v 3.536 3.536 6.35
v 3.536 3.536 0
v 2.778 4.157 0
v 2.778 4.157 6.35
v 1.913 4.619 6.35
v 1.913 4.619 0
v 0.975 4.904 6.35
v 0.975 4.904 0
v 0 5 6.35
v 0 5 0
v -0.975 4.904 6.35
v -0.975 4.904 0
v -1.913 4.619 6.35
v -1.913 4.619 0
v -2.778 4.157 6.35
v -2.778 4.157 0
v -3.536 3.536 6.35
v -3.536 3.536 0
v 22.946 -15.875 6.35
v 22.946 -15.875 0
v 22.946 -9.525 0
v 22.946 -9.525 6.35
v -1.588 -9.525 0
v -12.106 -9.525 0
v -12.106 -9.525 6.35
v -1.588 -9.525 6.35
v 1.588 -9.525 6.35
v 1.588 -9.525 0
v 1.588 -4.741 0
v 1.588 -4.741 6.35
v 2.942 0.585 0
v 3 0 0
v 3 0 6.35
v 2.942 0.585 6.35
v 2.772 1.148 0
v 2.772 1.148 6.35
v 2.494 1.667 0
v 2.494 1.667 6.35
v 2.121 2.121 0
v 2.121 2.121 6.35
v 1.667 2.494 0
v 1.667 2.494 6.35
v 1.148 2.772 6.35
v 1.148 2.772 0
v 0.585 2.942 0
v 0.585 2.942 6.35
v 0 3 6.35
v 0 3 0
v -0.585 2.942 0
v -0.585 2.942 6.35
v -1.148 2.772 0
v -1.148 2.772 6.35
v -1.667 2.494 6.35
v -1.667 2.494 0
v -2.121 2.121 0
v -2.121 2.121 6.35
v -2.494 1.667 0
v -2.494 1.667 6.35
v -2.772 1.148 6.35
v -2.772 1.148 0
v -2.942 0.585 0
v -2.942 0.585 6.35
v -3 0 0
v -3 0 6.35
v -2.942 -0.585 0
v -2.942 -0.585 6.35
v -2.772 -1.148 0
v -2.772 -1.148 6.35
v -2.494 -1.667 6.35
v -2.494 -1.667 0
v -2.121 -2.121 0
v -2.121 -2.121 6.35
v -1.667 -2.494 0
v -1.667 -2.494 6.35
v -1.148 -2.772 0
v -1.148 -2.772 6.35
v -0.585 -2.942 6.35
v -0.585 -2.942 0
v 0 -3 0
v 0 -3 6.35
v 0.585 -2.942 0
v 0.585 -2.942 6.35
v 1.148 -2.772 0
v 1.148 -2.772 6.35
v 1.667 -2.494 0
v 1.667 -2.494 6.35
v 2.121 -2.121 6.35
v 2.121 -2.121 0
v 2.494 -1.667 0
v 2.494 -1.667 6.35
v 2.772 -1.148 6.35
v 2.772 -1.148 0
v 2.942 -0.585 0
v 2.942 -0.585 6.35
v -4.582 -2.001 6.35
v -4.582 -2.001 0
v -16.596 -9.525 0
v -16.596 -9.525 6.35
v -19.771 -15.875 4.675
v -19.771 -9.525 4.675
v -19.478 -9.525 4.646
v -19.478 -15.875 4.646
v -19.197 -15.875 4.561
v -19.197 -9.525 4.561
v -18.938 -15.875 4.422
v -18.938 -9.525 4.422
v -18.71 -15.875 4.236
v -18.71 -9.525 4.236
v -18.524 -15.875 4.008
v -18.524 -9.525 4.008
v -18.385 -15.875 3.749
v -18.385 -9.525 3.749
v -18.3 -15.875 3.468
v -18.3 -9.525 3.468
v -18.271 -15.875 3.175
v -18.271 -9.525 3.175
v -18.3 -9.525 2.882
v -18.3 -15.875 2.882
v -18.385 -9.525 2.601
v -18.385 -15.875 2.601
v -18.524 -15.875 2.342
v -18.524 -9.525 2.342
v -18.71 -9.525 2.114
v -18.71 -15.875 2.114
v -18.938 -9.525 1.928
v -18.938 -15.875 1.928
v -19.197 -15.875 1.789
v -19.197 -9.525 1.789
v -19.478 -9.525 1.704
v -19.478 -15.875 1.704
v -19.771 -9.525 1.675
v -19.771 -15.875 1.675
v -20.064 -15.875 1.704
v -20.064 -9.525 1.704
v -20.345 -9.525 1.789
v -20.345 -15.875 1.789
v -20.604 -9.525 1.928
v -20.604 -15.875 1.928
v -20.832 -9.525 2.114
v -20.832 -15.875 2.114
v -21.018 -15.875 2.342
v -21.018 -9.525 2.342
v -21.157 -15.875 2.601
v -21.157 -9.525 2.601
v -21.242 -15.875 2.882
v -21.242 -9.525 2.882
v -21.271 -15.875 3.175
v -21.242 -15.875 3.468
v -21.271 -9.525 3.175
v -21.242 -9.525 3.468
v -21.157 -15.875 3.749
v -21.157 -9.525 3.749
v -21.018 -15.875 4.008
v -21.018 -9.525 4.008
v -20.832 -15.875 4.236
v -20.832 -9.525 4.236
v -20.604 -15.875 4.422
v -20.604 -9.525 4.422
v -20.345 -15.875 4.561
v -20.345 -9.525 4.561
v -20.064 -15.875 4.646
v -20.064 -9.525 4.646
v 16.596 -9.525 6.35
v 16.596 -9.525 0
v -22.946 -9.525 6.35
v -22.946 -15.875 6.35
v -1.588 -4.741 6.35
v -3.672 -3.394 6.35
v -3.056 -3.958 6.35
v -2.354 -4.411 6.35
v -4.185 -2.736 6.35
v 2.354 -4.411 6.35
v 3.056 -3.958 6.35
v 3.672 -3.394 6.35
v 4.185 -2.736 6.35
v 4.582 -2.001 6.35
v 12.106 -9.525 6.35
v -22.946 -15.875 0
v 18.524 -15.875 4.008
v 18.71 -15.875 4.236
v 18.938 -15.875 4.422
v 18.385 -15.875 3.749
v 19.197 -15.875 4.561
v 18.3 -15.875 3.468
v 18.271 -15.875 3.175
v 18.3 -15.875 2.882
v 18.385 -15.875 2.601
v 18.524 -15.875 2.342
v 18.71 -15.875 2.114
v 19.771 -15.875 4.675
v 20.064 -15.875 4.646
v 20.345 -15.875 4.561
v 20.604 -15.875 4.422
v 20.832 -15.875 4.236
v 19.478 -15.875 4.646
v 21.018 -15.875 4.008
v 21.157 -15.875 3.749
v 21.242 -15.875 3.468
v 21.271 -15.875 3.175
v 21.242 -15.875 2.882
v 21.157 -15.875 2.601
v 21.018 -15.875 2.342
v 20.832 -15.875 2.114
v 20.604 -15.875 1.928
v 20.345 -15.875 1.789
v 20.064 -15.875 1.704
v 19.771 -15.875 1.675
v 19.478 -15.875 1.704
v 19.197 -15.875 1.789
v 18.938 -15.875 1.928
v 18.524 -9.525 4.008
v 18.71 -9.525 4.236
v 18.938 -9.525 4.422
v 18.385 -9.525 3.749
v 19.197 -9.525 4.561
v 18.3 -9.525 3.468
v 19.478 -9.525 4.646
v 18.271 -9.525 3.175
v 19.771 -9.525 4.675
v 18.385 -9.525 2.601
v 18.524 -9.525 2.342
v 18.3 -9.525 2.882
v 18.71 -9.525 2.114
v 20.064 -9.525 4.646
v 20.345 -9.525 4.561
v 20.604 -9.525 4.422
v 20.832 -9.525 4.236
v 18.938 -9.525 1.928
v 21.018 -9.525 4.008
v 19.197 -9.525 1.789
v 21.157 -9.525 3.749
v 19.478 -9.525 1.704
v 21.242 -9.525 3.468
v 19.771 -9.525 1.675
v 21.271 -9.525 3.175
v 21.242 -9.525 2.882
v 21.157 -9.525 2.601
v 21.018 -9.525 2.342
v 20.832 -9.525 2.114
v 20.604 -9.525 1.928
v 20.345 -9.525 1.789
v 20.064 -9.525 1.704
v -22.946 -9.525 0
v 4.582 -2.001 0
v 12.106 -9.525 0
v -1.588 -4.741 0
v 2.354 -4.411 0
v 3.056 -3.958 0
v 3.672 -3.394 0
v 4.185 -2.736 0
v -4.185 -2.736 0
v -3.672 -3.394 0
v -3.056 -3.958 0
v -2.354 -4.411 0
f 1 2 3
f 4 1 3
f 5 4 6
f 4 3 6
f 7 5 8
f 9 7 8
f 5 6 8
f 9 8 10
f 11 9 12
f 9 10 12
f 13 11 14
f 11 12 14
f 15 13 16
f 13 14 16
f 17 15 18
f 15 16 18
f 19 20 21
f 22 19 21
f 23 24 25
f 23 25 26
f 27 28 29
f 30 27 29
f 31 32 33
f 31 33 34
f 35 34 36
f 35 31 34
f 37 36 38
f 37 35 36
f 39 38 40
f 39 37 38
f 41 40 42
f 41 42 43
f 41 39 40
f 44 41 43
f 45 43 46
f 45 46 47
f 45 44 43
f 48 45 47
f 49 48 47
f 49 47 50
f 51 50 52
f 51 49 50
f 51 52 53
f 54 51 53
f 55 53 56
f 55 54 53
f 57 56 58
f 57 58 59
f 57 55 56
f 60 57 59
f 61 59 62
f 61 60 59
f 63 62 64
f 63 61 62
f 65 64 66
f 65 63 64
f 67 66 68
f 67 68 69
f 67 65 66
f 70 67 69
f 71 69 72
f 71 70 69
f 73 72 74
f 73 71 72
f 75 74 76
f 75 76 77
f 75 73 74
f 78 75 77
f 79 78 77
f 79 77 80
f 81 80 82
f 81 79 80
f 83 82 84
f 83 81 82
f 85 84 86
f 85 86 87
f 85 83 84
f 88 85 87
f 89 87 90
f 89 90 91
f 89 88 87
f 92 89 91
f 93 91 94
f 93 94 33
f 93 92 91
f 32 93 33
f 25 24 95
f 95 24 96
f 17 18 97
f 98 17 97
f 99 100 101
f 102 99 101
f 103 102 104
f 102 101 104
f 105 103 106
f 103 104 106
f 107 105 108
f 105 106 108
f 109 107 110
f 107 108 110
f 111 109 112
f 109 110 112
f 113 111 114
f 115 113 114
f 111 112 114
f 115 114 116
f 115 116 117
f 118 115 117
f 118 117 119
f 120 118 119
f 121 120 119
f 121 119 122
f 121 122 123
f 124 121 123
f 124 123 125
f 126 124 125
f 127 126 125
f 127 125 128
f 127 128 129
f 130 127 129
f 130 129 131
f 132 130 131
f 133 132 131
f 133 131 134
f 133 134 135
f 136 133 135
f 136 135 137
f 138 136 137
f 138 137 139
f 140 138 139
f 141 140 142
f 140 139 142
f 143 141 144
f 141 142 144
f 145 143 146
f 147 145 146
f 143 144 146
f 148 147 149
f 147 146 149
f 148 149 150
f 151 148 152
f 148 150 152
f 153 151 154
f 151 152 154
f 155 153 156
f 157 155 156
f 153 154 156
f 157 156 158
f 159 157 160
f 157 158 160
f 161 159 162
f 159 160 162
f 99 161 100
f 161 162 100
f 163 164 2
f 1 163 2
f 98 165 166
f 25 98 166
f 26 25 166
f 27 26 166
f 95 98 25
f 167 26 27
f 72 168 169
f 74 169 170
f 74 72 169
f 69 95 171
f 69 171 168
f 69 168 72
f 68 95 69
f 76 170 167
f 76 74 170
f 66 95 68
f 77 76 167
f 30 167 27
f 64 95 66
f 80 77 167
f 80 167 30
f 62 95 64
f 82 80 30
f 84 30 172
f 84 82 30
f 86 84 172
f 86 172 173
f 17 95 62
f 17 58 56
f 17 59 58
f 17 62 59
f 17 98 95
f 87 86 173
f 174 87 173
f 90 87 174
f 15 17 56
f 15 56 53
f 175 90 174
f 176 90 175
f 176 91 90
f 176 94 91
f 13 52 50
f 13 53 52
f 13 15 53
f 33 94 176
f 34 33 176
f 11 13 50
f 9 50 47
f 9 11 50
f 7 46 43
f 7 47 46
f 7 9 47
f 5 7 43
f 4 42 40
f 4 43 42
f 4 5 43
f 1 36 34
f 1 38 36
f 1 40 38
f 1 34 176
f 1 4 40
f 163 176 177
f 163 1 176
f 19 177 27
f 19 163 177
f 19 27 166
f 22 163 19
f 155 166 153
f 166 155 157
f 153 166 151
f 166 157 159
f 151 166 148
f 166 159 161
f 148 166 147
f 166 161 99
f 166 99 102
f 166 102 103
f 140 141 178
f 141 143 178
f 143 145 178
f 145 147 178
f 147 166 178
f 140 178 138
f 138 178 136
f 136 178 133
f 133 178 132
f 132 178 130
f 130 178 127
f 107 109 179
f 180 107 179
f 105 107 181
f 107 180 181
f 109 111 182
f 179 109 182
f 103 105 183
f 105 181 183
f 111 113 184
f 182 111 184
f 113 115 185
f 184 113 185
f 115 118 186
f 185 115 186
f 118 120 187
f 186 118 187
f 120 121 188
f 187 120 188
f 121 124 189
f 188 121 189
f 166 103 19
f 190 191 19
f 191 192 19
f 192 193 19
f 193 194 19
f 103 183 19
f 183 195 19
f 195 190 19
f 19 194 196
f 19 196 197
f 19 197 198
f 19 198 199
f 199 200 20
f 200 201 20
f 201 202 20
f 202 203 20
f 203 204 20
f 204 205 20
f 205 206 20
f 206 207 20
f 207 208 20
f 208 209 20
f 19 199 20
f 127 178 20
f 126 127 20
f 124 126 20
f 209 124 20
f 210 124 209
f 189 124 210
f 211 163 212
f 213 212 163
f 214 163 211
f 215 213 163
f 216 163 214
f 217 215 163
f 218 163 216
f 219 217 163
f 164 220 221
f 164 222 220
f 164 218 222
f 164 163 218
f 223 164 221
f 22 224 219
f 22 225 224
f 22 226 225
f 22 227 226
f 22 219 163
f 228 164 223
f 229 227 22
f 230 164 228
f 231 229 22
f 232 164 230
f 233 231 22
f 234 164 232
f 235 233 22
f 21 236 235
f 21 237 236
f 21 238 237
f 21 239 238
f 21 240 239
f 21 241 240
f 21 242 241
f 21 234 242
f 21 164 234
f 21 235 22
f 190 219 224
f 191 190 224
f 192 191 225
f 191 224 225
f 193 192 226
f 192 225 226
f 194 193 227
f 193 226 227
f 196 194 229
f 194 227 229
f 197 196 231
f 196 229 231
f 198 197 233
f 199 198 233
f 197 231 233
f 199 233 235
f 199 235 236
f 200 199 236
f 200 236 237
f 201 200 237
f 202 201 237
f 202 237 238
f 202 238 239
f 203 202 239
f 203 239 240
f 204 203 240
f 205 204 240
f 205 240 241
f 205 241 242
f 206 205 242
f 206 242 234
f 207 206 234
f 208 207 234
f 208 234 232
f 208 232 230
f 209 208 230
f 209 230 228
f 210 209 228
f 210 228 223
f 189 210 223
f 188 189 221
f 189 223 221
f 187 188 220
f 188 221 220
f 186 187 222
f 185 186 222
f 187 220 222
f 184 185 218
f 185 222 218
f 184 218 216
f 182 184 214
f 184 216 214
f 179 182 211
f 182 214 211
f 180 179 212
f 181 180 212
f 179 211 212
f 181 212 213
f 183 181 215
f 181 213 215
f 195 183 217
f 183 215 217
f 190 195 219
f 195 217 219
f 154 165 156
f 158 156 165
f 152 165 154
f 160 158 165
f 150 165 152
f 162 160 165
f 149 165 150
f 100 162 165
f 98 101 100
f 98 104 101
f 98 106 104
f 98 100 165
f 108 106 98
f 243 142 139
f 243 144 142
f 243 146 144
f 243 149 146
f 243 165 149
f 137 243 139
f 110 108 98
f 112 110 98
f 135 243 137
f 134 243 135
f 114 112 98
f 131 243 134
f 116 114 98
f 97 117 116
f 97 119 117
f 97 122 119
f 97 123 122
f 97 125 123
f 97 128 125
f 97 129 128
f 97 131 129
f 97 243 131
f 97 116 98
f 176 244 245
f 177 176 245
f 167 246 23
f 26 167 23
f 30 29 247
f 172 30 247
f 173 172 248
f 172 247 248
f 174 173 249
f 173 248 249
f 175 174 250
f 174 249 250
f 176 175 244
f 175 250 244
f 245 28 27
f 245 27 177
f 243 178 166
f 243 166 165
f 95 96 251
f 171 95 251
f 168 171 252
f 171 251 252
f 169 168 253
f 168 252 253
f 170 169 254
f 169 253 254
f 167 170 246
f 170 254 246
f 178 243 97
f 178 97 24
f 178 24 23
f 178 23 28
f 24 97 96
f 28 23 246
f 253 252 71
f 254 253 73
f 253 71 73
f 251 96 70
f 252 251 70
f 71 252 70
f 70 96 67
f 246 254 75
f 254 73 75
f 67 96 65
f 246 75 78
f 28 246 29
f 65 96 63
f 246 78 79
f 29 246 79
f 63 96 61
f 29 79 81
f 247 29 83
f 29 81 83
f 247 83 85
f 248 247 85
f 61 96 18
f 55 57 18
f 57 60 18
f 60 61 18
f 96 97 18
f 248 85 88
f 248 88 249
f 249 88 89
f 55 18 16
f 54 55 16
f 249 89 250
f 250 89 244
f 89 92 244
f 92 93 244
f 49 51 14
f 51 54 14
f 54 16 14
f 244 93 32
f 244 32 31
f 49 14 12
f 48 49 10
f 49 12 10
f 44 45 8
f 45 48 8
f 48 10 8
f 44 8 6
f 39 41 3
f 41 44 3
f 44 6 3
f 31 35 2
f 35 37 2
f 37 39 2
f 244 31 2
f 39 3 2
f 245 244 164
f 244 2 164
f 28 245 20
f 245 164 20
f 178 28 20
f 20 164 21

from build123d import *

# Parameters (mm, degrees)
SKETCH1_R           = 5
SKETCH1_R_2         = 3
SKETCH1_W           = 45.892135624
SKETCH1_H           = 6.35
BOSS_EXTRUDE1_DEPTH = 6.35
SKETCH2_R           = 1.5
CUT_EXTRUDE1_DEPTH  = 28.889427262


with BuildPart() as part:
    # Sketch1 → Boss-Extrude1 (new body)
    # profile 1 of 5: a face of its own
    with BuildSketch(Plane.XY):
        Circle(SKETCH1_R)
        Circle(SKETCH1_R_2, mode=Mode.SUBTRACT)
    # profile 2 of 5: a face of its own
    with BuildSketch(Plane.XY):
        with BuildLine():
            ThreePointArc((-4.582078525, -2.001138774), (-4.913002543, 0.92865818), (-3.535533906, 3.535533906))
            Line((-3.535533906, 3.535533906), (-16.596067812, -9.525))
            Line((-16.596067812, -9.525), (-12.105939751, -9.525))
            Line((-12.105939751, -9.525), (-4.582078525, -2.001138774))
        make_face()
    # profile 3 of 5: a face of its own
    with BuildSketch(Plane.XY):
        with Locations((0, -12.7)):
            Rectangle(SKETCH1_W, SKETCH1_H)
    # profile 4 of 5: a face of its own
    with BuildSketch(Plane.XY):
        with BuildLine():
            ThreePointArc((1.5875, -4.741291359), (0, -5), (-1.5875, -4.741291359))
            Line((-1.5875, -4.741291359), (-1.5875, -9.525))
            Line((-1.5875, -9.525), (1.5875, -9.525))
            Line((1.5875, -9.525), (1.5875, -4.741291359))
        make_face()
    # profile 5 of 5: a face of its own
    with BuildSketch(Plane.XY):
        with BuildLine():
            Line((16.596067812, -9.525), (3.535533906, 3.535533906))
            ThreePointArc((3.535533906, 3.535533906), (4.619397663, 1.913417162), (5, 0))
            ThreePointArc((5, 0), (4.894404592, -1.022156391), (4.582078525, -2.001138774))
            Line((4.582078525, -2.001138774), (12.105939751, -9.525))
            Line((12.105939751, -9.525), (16.596067812, -9.525))
        make_face()
    extrude(amount=BOSS_EXTRUDE1_DEPTH)

    # Sketch2 → Cut-Extrude1 (cut, through all)
    with BuildSketch(Plane(origin=(0, -9.525, 0), x_dir=(1, 0, 0), z_dir=(0, 1, 0))):
        with Locations(Location((19.771067812, -3.175, 0), (0, 0, 270))):
            Circle(SKETCH2_R)
        with Locations(Location((-19.771067812, -3.175, 0), (0, 0, 270))):
            Circle(SKETCH2_R)
    extrude(amount=-CUT_EXTRUDE1_DEPTH, mode=Mode.SUBTRACT)


solid = part.part
